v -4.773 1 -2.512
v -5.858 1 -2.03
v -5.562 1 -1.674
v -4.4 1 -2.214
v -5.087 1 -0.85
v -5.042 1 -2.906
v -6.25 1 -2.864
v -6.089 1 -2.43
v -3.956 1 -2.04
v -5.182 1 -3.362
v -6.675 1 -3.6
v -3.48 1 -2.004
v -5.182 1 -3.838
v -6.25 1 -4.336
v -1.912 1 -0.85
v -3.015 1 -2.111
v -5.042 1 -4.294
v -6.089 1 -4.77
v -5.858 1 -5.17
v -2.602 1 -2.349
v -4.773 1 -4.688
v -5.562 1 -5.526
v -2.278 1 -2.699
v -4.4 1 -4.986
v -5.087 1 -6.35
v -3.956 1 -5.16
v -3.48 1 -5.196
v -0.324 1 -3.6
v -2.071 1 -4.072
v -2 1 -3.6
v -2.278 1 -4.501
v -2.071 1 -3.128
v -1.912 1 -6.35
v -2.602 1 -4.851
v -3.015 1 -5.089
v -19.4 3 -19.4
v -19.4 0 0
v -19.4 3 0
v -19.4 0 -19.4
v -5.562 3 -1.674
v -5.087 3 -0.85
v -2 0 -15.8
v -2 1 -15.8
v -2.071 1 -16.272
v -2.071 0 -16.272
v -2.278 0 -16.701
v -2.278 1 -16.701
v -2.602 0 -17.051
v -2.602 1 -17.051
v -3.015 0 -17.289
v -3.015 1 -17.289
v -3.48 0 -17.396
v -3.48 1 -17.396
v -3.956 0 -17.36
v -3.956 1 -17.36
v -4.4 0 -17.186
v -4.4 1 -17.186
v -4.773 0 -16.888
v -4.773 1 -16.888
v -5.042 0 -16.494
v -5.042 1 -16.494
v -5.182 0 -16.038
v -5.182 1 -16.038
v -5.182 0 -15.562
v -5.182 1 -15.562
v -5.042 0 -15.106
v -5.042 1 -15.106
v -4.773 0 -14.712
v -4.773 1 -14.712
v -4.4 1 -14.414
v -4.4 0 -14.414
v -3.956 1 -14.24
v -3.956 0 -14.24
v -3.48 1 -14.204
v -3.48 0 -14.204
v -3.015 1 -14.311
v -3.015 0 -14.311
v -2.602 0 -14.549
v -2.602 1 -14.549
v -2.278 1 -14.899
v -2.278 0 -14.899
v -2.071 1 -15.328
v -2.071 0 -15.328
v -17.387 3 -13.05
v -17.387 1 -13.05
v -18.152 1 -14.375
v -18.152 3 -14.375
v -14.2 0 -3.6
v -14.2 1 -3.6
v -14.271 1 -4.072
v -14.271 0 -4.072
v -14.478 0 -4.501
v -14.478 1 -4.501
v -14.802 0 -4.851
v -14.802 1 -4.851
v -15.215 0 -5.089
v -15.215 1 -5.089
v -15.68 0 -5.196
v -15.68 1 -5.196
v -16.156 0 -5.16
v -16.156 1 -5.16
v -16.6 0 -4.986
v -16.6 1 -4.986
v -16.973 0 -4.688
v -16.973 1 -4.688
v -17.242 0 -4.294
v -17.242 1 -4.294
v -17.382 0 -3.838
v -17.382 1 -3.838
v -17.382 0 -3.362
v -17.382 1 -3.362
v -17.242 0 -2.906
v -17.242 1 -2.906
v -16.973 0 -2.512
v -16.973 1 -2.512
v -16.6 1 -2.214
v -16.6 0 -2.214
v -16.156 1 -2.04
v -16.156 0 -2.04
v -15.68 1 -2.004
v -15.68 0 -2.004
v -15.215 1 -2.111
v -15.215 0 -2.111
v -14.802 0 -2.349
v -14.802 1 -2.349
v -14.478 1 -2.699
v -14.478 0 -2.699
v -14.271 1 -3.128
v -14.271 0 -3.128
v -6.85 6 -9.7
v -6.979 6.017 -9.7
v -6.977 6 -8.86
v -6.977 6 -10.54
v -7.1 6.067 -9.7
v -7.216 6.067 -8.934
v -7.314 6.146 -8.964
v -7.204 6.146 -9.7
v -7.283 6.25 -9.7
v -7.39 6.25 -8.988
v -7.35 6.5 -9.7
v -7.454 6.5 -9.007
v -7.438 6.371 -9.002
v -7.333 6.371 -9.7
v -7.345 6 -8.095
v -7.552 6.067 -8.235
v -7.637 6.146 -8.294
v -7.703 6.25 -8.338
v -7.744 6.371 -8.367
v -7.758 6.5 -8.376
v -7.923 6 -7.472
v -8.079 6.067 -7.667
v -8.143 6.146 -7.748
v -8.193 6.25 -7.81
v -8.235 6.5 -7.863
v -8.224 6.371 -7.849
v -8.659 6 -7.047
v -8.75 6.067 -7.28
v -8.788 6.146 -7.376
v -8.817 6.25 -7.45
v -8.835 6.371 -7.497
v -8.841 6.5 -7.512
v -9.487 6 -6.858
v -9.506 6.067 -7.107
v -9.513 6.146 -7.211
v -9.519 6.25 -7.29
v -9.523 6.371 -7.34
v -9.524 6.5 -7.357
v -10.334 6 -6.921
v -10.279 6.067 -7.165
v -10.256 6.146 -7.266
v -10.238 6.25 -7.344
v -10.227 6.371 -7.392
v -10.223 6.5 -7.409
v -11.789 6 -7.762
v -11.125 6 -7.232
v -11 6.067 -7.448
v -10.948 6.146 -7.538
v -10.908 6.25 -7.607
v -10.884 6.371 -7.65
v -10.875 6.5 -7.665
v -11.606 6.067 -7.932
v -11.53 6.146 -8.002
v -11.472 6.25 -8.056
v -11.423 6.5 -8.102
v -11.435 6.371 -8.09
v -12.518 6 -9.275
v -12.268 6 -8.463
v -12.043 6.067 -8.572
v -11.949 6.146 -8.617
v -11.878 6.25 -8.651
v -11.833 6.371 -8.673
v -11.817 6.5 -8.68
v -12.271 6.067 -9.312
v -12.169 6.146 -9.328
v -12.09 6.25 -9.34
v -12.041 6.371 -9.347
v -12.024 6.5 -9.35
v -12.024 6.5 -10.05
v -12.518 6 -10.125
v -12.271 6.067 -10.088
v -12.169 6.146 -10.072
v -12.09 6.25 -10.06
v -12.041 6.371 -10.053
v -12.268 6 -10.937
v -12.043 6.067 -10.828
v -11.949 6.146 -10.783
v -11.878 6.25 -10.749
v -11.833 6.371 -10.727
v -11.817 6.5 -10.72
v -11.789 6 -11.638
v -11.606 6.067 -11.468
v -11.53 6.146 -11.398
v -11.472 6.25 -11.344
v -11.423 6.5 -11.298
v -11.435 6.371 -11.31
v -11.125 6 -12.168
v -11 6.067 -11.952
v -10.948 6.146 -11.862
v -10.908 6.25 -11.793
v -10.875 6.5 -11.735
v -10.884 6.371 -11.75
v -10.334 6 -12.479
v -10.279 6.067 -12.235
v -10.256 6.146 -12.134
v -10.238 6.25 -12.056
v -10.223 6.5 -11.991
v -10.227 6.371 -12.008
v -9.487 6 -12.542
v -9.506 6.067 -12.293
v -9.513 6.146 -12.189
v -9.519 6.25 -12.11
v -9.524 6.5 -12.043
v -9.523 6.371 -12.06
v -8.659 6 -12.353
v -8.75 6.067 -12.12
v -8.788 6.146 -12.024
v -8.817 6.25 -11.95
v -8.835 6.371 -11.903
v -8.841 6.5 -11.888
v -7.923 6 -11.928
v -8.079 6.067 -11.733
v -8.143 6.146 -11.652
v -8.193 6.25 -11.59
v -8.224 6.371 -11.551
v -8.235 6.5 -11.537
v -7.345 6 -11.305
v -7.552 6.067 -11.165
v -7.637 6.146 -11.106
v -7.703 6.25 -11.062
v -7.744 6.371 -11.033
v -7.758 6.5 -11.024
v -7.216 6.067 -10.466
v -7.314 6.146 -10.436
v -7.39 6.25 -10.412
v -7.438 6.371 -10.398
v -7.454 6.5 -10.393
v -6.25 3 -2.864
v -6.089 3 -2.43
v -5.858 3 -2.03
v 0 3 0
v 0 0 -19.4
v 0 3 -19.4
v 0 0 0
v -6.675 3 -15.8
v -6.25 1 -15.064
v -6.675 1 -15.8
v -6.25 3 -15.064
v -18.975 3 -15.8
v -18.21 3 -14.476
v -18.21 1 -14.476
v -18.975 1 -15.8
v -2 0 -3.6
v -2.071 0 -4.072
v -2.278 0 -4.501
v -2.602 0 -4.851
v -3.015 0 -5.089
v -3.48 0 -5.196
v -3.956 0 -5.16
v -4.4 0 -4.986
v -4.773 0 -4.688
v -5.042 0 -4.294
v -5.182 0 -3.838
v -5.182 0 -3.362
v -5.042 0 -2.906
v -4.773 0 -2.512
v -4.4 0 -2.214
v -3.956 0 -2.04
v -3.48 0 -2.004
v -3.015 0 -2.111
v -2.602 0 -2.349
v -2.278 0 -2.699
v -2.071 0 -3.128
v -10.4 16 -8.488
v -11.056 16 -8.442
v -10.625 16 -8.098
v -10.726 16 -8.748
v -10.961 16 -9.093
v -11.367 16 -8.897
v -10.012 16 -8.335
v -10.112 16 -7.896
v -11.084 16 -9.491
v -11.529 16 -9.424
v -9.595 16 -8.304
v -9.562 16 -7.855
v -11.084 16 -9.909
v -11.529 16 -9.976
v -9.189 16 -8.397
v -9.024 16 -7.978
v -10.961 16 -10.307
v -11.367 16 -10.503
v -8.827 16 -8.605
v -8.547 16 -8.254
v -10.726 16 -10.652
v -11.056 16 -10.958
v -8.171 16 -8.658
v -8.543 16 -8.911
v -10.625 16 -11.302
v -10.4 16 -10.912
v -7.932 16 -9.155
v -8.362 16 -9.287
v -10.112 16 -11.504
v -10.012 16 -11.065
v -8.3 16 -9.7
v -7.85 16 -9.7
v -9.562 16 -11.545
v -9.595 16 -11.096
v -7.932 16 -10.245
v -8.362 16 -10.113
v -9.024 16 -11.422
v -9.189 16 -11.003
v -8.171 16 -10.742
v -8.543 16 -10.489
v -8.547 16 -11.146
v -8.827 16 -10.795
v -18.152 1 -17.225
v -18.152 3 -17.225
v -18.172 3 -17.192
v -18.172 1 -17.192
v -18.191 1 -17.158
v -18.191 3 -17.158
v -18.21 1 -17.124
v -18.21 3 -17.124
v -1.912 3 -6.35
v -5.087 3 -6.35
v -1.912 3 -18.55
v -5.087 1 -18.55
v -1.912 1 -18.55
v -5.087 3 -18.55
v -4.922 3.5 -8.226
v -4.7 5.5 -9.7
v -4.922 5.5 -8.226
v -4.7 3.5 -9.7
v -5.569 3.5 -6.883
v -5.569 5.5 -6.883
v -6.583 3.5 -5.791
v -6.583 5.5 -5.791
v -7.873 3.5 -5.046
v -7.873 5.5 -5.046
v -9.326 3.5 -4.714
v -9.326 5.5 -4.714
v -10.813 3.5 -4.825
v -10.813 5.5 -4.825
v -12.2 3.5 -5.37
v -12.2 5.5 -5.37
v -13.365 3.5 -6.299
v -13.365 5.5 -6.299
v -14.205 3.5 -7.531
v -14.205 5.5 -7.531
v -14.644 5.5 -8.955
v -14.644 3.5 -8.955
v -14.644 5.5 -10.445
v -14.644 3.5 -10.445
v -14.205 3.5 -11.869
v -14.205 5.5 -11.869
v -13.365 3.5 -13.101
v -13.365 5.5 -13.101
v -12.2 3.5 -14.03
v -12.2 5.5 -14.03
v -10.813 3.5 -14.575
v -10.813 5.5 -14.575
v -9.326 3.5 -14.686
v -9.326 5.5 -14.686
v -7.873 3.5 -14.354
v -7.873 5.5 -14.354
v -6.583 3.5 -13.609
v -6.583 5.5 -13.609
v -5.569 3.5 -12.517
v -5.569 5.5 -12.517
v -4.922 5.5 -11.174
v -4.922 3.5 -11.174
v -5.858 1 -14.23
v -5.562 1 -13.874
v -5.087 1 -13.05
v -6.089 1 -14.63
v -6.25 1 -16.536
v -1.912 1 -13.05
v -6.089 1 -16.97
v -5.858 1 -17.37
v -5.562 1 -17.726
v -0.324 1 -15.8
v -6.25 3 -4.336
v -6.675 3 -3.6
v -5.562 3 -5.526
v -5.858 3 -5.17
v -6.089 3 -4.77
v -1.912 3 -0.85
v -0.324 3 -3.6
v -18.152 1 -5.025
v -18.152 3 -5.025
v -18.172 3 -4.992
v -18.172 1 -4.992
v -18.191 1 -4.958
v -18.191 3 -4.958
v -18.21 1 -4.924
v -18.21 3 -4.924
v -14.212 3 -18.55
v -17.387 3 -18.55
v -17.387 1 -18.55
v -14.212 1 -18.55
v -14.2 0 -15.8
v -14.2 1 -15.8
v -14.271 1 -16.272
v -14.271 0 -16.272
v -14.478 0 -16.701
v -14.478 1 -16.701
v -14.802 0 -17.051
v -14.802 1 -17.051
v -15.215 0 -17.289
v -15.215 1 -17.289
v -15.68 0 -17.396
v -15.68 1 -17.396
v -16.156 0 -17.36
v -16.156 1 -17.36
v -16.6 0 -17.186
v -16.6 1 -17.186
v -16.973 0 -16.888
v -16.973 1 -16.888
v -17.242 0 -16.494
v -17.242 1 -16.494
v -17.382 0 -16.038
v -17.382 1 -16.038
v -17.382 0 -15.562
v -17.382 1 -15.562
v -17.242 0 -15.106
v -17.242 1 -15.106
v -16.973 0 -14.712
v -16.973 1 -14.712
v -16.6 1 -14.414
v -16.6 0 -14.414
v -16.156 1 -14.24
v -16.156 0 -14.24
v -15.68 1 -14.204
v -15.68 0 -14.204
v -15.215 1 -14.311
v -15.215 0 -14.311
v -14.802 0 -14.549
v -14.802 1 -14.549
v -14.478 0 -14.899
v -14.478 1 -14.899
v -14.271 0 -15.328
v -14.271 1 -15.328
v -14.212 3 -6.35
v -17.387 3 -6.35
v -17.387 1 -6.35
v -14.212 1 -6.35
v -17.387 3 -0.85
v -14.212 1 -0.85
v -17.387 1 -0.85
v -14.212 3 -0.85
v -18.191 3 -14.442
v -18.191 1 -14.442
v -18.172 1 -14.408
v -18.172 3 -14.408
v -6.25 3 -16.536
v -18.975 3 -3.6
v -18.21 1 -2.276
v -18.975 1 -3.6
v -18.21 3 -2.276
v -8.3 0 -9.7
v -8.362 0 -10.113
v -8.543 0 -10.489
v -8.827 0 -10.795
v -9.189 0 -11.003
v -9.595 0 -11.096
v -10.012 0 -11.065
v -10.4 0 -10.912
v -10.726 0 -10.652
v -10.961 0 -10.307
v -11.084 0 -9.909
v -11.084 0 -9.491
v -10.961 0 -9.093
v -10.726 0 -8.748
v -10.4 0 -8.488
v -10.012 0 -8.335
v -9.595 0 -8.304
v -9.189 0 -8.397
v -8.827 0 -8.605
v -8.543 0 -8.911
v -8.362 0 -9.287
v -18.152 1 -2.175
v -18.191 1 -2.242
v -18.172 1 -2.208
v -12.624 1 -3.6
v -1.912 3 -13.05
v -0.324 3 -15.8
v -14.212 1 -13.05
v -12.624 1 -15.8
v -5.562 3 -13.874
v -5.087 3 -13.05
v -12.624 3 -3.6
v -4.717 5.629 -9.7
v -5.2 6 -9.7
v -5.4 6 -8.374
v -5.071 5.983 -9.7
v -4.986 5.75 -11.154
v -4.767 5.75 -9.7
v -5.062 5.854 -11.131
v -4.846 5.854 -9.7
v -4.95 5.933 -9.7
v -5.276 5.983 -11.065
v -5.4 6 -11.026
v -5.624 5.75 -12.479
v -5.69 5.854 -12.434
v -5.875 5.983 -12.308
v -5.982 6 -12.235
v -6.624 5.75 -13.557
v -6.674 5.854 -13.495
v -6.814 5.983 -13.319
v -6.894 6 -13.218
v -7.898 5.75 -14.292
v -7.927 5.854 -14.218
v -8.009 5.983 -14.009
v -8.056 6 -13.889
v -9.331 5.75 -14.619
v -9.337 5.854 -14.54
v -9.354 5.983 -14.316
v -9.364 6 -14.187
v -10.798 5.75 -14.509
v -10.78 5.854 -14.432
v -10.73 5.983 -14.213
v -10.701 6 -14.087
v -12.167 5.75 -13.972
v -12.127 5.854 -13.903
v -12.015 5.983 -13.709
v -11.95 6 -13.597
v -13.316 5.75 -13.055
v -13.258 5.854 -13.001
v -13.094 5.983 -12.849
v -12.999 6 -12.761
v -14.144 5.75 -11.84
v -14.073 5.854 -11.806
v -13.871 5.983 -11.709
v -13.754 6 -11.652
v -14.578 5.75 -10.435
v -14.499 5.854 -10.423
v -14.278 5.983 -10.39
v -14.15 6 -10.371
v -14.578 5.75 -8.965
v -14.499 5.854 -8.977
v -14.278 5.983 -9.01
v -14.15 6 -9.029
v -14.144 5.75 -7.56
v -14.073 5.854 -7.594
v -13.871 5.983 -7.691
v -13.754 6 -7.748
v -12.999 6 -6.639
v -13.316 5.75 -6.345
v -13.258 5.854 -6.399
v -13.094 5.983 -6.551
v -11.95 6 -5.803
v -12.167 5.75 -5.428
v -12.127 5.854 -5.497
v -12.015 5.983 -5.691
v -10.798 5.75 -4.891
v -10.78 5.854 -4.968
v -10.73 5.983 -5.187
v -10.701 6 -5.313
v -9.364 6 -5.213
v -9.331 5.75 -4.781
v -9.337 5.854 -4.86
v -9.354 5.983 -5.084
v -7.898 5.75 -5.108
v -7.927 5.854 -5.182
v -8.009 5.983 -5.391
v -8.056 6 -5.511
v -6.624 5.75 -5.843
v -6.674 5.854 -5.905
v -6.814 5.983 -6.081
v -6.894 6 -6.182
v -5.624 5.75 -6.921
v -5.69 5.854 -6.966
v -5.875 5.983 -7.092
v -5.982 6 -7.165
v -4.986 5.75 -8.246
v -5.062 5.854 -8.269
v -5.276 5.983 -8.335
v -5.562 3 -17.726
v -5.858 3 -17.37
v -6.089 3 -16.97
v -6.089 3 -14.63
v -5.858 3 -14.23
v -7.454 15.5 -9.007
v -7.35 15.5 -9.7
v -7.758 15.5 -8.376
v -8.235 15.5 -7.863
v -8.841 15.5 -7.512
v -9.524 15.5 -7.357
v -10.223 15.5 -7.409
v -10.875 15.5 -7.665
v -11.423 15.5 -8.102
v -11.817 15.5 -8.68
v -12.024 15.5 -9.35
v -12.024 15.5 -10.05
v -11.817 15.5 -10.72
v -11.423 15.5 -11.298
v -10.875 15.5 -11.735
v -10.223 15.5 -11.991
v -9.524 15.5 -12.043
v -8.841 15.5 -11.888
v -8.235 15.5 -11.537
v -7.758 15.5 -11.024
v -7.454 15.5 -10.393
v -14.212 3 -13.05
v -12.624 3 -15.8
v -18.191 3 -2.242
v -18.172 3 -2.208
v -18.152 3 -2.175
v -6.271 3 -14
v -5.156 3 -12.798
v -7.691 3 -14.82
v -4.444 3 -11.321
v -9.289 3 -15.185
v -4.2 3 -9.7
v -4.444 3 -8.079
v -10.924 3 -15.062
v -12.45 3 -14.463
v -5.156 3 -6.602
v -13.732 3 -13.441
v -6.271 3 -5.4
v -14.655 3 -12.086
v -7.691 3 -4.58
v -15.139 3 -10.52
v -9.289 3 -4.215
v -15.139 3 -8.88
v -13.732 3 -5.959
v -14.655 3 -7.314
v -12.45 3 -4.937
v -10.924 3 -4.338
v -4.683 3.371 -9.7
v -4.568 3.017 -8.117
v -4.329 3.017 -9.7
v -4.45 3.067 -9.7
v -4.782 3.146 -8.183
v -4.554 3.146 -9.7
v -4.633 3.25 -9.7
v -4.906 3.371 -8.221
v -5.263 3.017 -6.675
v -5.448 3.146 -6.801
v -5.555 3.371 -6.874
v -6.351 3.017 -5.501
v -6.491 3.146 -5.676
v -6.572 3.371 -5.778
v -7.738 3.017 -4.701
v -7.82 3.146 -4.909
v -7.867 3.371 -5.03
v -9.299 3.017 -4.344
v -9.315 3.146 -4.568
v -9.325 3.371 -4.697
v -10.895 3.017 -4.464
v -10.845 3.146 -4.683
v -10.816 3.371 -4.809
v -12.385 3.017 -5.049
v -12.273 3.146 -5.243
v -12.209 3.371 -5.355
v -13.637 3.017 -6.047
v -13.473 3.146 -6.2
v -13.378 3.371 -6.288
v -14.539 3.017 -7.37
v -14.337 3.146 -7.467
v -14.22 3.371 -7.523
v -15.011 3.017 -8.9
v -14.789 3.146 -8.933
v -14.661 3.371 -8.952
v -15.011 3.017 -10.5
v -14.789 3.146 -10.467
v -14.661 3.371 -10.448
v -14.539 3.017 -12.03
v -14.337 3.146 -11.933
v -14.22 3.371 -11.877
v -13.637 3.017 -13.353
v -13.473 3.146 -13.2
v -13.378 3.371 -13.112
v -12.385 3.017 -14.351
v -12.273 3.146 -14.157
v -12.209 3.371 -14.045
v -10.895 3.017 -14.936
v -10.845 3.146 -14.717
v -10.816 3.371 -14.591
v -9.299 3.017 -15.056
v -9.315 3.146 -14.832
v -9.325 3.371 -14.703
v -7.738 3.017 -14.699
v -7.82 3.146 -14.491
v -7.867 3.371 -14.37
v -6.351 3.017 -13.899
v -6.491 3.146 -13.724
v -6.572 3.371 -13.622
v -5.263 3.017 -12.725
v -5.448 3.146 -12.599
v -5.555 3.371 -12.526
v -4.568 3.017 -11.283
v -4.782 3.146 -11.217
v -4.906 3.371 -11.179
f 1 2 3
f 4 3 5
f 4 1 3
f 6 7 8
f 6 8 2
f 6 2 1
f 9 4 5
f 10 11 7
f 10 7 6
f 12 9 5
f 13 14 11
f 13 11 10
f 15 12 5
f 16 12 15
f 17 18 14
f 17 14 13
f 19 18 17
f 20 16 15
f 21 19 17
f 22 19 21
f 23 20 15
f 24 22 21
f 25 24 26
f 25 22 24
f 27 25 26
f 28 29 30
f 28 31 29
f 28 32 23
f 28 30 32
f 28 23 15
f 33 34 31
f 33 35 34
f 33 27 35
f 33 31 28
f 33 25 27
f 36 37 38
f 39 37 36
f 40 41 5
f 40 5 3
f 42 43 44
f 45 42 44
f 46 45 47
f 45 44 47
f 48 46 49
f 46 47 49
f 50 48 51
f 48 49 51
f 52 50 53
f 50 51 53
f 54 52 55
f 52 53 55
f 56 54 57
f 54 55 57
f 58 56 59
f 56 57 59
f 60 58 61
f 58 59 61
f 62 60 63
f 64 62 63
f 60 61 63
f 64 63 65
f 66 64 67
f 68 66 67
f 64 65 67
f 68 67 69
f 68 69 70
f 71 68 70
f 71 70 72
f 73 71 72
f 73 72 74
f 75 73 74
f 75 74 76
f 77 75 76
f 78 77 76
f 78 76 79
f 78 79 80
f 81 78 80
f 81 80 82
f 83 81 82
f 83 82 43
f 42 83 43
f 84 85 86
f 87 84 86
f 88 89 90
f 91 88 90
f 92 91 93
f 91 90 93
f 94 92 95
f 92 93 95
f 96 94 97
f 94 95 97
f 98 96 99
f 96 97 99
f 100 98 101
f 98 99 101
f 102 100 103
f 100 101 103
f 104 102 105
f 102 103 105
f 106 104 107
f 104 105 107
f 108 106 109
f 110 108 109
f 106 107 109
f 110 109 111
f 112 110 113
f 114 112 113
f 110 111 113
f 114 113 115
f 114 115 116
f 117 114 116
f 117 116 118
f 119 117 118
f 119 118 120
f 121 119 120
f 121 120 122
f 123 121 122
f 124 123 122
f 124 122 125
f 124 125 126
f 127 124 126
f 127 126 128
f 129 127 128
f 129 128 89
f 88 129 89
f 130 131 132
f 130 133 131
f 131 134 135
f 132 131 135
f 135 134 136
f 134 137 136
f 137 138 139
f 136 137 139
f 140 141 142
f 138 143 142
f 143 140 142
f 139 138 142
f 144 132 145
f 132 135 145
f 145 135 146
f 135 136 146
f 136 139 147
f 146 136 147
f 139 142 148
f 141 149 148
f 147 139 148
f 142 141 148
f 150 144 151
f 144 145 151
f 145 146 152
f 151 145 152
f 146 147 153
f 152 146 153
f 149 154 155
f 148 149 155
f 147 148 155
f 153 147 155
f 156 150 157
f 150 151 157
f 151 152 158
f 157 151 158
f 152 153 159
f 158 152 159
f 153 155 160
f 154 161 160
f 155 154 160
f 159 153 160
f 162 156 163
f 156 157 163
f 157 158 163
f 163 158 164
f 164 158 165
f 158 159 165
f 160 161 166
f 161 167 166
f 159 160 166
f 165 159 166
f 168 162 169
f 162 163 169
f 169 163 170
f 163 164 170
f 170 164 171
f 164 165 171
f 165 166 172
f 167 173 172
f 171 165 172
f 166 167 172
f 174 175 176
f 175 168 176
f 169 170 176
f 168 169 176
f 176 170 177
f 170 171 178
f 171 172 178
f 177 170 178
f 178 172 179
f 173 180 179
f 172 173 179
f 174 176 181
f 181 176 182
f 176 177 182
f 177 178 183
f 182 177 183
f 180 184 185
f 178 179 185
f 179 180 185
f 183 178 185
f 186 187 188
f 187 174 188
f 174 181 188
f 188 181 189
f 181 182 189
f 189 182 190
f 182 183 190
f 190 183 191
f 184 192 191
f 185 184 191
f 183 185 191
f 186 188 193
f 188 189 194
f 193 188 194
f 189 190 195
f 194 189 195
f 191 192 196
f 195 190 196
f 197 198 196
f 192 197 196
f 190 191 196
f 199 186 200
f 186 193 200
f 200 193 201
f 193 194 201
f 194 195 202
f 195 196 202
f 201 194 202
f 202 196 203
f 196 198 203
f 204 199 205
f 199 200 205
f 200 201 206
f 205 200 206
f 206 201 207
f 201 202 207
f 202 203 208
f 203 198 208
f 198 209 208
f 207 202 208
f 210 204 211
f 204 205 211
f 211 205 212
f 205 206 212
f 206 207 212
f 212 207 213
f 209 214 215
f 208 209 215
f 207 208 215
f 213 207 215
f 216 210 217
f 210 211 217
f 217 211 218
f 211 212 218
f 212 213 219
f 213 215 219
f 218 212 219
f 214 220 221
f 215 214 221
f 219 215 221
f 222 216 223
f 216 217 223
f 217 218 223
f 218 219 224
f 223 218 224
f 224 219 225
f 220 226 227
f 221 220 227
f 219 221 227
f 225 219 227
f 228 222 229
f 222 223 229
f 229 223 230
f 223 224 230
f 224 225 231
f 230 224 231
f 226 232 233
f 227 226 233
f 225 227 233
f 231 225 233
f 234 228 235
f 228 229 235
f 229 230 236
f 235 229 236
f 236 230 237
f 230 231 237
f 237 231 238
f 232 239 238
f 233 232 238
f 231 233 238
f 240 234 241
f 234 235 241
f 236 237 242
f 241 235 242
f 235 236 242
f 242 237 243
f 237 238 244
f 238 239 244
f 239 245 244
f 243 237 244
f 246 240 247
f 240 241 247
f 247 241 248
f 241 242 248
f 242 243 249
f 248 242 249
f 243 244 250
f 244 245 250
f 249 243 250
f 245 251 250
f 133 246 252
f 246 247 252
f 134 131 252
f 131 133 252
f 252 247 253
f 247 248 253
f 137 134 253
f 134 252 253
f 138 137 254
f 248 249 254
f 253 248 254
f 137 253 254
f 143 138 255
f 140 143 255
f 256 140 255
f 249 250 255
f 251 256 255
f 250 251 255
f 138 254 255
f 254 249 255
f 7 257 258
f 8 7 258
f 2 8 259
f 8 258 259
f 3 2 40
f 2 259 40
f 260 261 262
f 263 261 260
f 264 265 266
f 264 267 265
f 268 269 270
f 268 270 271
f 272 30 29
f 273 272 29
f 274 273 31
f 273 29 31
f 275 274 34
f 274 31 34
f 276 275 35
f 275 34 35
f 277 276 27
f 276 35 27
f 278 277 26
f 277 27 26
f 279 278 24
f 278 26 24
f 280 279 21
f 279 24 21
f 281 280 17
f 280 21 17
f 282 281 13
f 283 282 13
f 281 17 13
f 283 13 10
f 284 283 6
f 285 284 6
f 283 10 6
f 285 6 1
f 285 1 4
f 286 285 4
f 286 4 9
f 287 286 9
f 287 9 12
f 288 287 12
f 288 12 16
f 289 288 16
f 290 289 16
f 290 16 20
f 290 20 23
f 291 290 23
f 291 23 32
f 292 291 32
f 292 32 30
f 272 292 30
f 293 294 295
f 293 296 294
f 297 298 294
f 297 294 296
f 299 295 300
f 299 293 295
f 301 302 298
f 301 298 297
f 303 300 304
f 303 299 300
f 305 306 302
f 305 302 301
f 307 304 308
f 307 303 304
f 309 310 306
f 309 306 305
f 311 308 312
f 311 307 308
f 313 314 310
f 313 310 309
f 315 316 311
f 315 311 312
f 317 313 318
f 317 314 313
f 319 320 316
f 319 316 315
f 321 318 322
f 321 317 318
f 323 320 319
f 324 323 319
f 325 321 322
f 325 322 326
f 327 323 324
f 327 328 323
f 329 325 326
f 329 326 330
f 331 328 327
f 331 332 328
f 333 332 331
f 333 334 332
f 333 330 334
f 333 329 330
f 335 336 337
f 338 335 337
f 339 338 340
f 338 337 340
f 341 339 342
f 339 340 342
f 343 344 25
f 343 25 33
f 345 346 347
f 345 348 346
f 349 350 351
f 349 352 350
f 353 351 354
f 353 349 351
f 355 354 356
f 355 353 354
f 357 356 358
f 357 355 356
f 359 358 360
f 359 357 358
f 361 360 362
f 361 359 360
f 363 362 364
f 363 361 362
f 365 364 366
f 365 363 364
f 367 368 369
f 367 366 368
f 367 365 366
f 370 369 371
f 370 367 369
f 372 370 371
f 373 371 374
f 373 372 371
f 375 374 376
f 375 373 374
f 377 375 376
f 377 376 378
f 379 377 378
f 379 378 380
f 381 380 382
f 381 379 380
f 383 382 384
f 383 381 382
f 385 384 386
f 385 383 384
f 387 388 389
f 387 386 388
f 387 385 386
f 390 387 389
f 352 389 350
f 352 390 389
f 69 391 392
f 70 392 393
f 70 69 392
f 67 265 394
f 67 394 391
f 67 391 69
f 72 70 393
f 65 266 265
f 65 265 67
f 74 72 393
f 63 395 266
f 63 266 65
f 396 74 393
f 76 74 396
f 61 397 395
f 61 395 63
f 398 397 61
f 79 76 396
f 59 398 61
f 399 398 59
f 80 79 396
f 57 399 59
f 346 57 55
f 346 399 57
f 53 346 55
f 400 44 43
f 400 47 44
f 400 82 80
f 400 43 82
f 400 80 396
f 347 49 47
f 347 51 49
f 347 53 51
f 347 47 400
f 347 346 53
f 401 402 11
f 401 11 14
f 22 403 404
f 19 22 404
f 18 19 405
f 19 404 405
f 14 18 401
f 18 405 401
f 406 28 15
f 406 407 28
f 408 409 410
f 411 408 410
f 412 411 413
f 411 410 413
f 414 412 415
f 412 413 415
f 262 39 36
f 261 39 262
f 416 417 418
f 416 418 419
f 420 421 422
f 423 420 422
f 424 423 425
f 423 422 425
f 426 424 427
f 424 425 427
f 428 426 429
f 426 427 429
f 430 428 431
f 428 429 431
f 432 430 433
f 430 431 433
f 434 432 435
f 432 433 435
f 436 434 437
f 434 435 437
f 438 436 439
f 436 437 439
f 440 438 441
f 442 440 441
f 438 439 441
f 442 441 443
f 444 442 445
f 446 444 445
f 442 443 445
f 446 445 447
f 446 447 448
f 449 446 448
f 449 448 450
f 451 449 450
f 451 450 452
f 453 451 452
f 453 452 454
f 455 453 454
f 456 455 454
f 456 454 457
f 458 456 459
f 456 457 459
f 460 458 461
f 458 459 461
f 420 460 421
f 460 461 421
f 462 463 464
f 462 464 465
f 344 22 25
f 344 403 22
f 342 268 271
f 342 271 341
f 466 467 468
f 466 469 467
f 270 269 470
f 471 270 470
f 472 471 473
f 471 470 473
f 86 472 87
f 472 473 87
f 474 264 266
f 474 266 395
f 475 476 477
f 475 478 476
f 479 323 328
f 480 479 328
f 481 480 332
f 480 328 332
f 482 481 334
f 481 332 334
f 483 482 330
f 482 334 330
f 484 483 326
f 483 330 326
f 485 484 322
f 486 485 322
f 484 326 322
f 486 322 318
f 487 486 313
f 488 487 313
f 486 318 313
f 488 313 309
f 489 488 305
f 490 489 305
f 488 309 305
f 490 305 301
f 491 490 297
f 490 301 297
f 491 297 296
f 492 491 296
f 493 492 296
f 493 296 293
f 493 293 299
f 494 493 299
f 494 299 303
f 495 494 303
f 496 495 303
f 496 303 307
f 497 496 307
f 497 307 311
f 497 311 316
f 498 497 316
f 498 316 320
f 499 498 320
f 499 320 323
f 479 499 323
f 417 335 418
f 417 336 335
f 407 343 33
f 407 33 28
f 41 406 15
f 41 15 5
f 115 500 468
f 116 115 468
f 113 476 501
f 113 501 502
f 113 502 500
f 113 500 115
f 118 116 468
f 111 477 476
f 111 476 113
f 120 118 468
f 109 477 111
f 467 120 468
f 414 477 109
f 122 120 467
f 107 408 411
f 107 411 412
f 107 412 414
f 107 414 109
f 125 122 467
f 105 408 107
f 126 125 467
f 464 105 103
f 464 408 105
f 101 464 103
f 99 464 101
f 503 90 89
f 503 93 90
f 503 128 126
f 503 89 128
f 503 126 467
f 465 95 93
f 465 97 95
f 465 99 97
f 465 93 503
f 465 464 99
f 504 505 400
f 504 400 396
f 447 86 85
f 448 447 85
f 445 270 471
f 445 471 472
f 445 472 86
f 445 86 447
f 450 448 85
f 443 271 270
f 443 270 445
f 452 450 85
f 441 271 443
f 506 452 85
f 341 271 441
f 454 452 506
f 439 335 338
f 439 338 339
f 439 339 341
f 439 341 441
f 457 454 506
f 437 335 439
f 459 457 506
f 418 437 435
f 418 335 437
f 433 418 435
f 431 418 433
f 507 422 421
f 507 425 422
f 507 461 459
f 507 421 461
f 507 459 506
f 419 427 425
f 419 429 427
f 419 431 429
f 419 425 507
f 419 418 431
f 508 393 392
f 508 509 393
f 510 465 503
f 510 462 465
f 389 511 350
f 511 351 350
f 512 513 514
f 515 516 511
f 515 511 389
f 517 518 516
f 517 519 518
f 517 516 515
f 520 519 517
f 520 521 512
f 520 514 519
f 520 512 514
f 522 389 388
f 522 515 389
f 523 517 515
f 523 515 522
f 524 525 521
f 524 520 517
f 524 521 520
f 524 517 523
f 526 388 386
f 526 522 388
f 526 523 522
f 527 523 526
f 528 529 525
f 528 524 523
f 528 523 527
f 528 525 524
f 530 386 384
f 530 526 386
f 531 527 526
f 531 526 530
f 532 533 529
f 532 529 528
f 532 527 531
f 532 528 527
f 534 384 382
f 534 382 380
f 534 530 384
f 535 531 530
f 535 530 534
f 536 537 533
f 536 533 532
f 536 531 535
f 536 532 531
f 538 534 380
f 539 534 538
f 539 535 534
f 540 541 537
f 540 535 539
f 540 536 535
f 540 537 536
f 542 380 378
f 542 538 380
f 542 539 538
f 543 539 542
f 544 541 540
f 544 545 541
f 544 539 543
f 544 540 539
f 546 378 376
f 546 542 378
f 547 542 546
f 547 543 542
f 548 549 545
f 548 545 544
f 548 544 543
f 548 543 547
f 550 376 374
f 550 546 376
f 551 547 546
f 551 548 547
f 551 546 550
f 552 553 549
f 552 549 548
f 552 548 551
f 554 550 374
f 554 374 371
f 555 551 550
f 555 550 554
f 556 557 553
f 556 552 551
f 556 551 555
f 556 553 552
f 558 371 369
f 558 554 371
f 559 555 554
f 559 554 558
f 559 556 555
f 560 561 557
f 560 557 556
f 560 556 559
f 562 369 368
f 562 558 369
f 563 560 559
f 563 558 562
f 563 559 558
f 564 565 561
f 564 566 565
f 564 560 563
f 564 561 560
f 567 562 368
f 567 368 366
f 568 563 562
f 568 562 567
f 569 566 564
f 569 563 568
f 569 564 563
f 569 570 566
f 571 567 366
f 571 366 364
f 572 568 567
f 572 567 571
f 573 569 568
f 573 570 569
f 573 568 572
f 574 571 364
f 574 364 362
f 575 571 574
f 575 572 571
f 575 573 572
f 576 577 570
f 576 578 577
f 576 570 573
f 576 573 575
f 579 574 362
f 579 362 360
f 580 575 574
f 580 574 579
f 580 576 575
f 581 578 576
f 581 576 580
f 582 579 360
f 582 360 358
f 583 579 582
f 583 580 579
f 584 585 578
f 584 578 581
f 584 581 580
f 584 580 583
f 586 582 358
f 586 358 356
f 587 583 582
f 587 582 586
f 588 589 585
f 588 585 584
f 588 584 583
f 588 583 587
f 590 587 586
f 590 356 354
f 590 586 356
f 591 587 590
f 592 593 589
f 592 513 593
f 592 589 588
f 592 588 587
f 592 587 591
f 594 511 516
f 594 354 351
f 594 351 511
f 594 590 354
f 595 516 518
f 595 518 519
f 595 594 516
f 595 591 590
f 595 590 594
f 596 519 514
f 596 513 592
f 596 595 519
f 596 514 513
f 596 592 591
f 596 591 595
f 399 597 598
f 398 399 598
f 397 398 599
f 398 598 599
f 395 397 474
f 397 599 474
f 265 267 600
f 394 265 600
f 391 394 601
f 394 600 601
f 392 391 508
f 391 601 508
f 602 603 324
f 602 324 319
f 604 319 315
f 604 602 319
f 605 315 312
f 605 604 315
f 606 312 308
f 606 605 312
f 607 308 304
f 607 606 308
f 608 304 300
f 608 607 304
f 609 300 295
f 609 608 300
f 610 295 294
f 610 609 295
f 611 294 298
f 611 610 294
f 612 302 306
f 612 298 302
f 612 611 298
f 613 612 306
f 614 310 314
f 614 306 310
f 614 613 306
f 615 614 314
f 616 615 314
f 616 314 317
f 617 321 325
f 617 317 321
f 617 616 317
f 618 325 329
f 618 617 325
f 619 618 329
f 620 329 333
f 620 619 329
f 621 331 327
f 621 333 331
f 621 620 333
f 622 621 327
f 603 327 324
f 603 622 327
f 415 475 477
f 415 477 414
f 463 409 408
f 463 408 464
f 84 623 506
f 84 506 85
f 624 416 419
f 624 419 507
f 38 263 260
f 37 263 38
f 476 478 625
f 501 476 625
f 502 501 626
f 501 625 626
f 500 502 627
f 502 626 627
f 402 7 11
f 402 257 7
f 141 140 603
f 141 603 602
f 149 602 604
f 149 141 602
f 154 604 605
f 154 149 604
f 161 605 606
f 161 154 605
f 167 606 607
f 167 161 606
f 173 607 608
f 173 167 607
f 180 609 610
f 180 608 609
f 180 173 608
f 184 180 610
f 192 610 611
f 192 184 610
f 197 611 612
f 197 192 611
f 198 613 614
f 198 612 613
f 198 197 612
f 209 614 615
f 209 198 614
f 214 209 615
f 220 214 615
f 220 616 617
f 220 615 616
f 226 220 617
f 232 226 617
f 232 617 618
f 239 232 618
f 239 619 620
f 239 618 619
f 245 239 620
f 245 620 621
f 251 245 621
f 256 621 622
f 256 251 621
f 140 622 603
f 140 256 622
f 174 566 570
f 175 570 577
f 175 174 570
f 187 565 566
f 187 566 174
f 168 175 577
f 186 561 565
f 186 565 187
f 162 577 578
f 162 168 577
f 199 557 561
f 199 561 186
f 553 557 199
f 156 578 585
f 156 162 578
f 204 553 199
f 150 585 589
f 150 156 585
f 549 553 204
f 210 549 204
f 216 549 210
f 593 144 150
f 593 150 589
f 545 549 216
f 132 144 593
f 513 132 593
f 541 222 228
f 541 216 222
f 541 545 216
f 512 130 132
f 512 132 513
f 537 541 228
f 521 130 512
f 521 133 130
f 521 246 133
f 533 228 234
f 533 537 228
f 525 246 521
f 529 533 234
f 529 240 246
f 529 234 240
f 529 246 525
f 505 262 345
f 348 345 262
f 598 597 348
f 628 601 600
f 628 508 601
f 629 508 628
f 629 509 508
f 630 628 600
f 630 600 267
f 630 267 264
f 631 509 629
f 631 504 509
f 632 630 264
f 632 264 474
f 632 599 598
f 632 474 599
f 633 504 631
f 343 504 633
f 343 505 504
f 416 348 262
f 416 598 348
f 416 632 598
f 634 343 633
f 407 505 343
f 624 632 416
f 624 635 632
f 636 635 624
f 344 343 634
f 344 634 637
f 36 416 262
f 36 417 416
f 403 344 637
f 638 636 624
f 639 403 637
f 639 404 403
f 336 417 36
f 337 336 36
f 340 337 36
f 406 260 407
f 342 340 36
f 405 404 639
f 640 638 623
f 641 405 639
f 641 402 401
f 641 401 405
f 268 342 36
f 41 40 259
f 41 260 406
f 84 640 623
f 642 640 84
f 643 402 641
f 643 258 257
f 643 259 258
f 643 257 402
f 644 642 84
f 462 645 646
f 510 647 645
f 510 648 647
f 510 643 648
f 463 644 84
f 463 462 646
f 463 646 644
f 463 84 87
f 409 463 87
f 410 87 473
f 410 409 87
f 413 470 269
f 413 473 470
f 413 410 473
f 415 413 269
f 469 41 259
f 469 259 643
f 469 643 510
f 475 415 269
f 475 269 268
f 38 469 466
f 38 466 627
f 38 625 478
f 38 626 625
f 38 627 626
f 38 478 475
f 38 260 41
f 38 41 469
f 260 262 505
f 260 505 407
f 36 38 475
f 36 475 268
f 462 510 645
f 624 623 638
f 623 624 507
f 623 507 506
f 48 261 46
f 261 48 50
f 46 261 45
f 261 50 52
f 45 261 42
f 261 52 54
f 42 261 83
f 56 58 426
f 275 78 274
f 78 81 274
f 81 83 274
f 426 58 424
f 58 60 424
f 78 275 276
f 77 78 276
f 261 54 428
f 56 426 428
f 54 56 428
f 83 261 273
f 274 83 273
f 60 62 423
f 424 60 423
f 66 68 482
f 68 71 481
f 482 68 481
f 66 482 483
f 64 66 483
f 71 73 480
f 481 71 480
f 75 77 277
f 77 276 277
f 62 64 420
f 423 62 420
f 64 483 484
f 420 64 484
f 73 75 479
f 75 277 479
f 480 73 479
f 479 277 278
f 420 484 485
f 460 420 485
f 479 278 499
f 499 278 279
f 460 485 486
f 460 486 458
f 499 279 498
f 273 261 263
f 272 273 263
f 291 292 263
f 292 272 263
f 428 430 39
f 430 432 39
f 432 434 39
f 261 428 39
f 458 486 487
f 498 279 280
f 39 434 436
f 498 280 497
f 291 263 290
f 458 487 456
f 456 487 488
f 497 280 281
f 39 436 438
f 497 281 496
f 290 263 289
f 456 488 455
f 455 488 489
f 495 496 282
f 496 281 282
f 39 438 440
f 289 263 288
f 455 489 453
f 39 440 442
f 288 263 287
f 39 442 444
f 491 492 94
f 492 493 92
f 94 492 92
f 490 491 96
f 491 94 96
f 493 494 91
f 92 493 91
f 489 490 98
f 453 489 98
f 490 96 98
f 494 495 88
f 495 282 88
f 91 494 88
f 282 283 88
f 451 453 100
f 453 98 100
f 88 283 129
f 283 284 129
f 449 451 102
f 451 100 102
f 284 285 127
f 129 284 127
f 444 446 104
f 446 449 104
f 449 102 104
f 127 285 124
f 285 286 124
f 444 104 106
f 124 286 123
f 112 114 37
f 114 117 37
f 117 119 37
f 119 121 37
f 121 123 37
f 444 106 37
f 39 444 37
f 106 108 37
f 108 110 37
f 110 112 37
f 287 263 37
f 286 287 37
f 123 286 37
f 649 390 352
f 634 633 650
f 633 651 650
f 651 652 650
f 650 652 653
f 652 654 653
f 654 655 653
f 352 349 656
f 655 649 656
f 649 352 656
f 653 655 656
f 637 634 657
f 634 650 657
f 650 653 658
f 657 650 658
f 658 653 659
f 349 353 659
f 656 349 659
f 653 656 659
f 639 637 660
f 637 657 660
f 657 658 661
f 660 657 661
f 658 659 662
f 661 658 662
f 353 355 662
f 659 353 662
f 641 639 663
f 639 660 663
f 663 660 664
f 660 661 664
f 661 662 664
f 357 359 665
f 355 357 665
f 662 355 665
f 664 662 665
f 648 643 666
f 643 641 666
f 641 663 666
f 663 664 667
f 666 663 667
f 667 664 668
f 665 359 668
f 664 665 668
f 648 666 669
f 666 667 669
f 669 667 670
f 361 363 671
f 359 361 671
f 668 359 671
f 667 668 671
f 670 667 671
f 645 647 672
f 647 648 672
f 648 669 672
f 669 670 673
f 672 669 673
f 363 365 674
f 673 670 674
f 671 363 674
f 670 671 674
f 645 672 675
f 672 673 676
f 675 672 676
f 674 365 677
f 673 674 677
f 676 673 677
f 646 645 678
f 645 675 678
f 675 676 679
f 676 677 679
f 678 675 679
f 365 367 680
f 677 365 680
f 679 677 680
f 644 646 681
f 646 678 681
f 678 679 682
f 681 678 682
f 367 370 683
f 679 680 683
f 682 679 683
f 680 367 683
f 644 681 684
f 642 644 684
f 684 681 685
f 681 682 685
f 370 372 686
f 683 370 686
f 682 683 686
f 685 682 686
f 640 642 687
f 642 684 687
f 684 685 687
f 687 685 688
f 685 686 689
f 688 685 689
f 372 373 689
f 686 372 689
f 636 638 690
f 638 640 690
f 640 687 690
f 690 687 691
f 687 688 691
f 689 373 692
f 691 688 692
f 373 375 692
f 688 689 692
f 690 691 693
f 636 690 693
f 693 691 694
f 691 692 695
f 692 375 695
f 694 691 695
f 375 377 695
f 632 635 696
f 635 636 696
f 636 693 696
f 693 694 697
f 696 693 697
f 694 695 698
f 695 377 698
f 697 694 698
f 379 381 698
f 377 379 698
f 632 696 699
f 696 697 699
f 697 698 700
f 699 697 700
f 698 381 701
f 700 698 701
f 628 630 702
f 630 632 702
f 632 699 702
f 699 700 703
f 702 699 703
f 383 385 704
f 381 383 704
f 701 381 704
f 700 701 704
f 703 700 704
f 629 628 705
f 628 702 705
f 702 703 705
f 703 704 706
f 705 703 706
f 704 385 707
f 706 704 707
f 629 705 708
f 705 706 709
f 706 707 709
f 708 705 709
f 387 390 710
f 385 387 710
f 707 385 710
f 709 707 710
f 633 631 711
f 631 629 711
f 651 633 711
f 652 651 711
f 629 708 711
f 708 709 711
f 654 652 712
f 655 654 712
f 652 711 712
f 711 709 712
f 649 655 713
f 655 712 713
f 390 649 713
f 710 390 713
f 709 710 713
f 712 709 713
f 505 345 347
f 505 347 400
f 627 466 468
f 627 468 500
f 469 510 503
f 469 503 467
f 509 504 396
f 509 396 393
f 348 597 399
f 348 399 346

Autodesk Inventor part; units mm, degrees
ref_plane "YZ Plane" through (0, 0, 0) normal (1, 0, 0) x (0, 1, 0)
ref_plane "XZ Plane" through (0, 0, 0) normal (0, 1, 0) x (-1, 0, 0)
ref_plane "XY Plane" through (0, 0, 0) normal (0, 0, 1) x (1, 0, 0)
sketch "Sketch1" plane through (0, 0, 0) normal (0, 1, 0) x (-1, 0, 0)
  line L0 (0, 0) -> (19.4, 0)
  line L1 (19.4, 0) -> (19.4, -19.4)
  line L2 (19.4, -19.4) -> (0, -19.4)
  line L3 (0, -19.4) -> (0, 0)
  dimension "d0" = 19.4
  dimension "d1" = 19.4
extrude "Extrusion1" add sketch "Sketch1" along normal blind 3
sketch "Sketch2" plane through (0, 3, 0) normal (0, 1, 0) x (1, 0, 0)
  circle A0 centre (-15.8, 3.6) radius 1.6
  line L0 (-19.4, 19.4) -> (-19.4, 0) projected
  line L1 (-19.4, 0) -> (0, 0) projected
  dimension "d4" = 3.2
  dimension "d5" = 3.6
  dimension "d6" = 3.6
extrude "Extrusion2" cut sketch "Sketch2" against normal through all
pattern_linear "Rectangular Pattern1" count 2 spacing 12.2 along (0, 0, -1) count 2 spacing 12.2 along (1, 0, 0) of "Extrusion2"
sketch "Sketch3" plane through (0, 3, 0) normal (0, 1, 0) x (1, 0, 0)
  circle A0 centre (-9.7, 9.7) radius 5
  line L0 (-19.4, 0) -> (0, 0) projected
  line L1 (0, 0) -> (0, 19.4) projected
  dimension "d15" = 10
  dimension "d16" = 9.7
  dimension "d17" = 9.7
extrude "Extrusion3" add sketch "Sketch3" along normal blind 3
sketch "Sketch4" plane through (-9.7, 6, -9.7) normal (0, 1, 0) x (1, 0, 0)
  circle A0 centre (0, 0) radius 2.35
  line L0 (9.7, -9.7) -> (9.7, 9.7) projected
  line L1 (-9.7, -9.7) -> (9.7, -9.7) projected
  dimension "d20" = 4.7
  dimension "d21" = 9.7
  dimension "d22" = 9.7
extrude "Extrusion4" add sketch "Sketch4" along normal blind 10
fillet "Fillet1" radius 0.5 1 edges at (-14.7, 3, -9.7)
fillet "Fillet2" radius 0.5 1 edges at (-14.7, 6, -9.7)
fillet "Fillet3" radius 0.5 1 edges at (-12.05, 6, -9.7)
sketch "Sketch5" plane through (-9.7, 16, -9.7) normal (0, 1, 0) x (1, 0, 0)
  circle A0 centre (0, 0) radius 1.4
  line L0 (9.7, -9.7) -> (9.7, 9.7) projected
  line L1 (-9.7, -9.7) -> (9.7, -9.7) projected
  dimension "d28" = 2.8
  dimension "d29" = 9.7
  dimension "d30" = 9.7
extrude "Extrusion5" cut sketch "Sketch5" against normal through all
sketch "Sketch6" plane through (0, 3, 0) normal (0, 1, 0) x (1, 0, 0)
  circle A0 centre (-3.6, 3.6) radius 2.75
  line L0 (0, 0) -> (0, 19.4) projected
  line L1 (-19.4, 0) -> (0, 0) projected
  dimension "d33" = 5.5
  dimension "d34" = 3.6
  dimension "d35" = 3.6
extrude "Extrusion6" cut sketch "Sketch6" against normal blind 2
pattern_linear "Rectangular Pattern2" count 2 spacing 12.2 along (0, 0, -1) count 2 spacing 12.2 along (-1, 0, 0) of "Extrusion6"
sketch "Sketch7" plane through (0, 3, 0) normal (0, 1, 0) x (1, 0, 0)
  line L0 (-17.387, 18.55) -> (-14.2116, 18.55)
  line L1 (-14.2116, 18.55) -> (-12.6239, 15.8)
  line L2 (-12.6239, 15.8) -> (-14.2116, 13.05)
  line L3 (-14.2116, 13.05) -> (-17.387, 13.05)
  line L4 (-17.387, 13.05) -> (-18.9747, 15.8)
  line L5 (-18.9747, 15.8) -> (-17.387, 18.55)
  line L6 (-19.4, 19.4) -> (-19.4, 0) projected
  line L7 (0, 19.4) -> (-19.4, 19.4) projected
  point P0 (0, 0)
  dimension "d56" = 0
  dimension "d57" = 0
  dimension "d58" = 0
  dimension "d59" = 5.5
  dimension "d60" = 5.5
  dimension "d61" = 120
  dimension "d62" = 2.013
  dimension "d63" = 0.85
extrude "Extrusion7" cut sketch "Sketch7" against normal blind 2
pattern_linear "Rectangular Pattern3" count 2 spacing 12.3 along (1, 0, 0) count 2 spacing 12.2 along (0, 0, 1) of "Extrusion7"
chamfer "Chamfer1" distance 0.5 angle 45 1 edges at (-12.05, 16, -9.7)
equation "\"d1\" = d0"
equation "\"d17\" = d16"
properties part number "INTERFACE_MANIFOLD"
